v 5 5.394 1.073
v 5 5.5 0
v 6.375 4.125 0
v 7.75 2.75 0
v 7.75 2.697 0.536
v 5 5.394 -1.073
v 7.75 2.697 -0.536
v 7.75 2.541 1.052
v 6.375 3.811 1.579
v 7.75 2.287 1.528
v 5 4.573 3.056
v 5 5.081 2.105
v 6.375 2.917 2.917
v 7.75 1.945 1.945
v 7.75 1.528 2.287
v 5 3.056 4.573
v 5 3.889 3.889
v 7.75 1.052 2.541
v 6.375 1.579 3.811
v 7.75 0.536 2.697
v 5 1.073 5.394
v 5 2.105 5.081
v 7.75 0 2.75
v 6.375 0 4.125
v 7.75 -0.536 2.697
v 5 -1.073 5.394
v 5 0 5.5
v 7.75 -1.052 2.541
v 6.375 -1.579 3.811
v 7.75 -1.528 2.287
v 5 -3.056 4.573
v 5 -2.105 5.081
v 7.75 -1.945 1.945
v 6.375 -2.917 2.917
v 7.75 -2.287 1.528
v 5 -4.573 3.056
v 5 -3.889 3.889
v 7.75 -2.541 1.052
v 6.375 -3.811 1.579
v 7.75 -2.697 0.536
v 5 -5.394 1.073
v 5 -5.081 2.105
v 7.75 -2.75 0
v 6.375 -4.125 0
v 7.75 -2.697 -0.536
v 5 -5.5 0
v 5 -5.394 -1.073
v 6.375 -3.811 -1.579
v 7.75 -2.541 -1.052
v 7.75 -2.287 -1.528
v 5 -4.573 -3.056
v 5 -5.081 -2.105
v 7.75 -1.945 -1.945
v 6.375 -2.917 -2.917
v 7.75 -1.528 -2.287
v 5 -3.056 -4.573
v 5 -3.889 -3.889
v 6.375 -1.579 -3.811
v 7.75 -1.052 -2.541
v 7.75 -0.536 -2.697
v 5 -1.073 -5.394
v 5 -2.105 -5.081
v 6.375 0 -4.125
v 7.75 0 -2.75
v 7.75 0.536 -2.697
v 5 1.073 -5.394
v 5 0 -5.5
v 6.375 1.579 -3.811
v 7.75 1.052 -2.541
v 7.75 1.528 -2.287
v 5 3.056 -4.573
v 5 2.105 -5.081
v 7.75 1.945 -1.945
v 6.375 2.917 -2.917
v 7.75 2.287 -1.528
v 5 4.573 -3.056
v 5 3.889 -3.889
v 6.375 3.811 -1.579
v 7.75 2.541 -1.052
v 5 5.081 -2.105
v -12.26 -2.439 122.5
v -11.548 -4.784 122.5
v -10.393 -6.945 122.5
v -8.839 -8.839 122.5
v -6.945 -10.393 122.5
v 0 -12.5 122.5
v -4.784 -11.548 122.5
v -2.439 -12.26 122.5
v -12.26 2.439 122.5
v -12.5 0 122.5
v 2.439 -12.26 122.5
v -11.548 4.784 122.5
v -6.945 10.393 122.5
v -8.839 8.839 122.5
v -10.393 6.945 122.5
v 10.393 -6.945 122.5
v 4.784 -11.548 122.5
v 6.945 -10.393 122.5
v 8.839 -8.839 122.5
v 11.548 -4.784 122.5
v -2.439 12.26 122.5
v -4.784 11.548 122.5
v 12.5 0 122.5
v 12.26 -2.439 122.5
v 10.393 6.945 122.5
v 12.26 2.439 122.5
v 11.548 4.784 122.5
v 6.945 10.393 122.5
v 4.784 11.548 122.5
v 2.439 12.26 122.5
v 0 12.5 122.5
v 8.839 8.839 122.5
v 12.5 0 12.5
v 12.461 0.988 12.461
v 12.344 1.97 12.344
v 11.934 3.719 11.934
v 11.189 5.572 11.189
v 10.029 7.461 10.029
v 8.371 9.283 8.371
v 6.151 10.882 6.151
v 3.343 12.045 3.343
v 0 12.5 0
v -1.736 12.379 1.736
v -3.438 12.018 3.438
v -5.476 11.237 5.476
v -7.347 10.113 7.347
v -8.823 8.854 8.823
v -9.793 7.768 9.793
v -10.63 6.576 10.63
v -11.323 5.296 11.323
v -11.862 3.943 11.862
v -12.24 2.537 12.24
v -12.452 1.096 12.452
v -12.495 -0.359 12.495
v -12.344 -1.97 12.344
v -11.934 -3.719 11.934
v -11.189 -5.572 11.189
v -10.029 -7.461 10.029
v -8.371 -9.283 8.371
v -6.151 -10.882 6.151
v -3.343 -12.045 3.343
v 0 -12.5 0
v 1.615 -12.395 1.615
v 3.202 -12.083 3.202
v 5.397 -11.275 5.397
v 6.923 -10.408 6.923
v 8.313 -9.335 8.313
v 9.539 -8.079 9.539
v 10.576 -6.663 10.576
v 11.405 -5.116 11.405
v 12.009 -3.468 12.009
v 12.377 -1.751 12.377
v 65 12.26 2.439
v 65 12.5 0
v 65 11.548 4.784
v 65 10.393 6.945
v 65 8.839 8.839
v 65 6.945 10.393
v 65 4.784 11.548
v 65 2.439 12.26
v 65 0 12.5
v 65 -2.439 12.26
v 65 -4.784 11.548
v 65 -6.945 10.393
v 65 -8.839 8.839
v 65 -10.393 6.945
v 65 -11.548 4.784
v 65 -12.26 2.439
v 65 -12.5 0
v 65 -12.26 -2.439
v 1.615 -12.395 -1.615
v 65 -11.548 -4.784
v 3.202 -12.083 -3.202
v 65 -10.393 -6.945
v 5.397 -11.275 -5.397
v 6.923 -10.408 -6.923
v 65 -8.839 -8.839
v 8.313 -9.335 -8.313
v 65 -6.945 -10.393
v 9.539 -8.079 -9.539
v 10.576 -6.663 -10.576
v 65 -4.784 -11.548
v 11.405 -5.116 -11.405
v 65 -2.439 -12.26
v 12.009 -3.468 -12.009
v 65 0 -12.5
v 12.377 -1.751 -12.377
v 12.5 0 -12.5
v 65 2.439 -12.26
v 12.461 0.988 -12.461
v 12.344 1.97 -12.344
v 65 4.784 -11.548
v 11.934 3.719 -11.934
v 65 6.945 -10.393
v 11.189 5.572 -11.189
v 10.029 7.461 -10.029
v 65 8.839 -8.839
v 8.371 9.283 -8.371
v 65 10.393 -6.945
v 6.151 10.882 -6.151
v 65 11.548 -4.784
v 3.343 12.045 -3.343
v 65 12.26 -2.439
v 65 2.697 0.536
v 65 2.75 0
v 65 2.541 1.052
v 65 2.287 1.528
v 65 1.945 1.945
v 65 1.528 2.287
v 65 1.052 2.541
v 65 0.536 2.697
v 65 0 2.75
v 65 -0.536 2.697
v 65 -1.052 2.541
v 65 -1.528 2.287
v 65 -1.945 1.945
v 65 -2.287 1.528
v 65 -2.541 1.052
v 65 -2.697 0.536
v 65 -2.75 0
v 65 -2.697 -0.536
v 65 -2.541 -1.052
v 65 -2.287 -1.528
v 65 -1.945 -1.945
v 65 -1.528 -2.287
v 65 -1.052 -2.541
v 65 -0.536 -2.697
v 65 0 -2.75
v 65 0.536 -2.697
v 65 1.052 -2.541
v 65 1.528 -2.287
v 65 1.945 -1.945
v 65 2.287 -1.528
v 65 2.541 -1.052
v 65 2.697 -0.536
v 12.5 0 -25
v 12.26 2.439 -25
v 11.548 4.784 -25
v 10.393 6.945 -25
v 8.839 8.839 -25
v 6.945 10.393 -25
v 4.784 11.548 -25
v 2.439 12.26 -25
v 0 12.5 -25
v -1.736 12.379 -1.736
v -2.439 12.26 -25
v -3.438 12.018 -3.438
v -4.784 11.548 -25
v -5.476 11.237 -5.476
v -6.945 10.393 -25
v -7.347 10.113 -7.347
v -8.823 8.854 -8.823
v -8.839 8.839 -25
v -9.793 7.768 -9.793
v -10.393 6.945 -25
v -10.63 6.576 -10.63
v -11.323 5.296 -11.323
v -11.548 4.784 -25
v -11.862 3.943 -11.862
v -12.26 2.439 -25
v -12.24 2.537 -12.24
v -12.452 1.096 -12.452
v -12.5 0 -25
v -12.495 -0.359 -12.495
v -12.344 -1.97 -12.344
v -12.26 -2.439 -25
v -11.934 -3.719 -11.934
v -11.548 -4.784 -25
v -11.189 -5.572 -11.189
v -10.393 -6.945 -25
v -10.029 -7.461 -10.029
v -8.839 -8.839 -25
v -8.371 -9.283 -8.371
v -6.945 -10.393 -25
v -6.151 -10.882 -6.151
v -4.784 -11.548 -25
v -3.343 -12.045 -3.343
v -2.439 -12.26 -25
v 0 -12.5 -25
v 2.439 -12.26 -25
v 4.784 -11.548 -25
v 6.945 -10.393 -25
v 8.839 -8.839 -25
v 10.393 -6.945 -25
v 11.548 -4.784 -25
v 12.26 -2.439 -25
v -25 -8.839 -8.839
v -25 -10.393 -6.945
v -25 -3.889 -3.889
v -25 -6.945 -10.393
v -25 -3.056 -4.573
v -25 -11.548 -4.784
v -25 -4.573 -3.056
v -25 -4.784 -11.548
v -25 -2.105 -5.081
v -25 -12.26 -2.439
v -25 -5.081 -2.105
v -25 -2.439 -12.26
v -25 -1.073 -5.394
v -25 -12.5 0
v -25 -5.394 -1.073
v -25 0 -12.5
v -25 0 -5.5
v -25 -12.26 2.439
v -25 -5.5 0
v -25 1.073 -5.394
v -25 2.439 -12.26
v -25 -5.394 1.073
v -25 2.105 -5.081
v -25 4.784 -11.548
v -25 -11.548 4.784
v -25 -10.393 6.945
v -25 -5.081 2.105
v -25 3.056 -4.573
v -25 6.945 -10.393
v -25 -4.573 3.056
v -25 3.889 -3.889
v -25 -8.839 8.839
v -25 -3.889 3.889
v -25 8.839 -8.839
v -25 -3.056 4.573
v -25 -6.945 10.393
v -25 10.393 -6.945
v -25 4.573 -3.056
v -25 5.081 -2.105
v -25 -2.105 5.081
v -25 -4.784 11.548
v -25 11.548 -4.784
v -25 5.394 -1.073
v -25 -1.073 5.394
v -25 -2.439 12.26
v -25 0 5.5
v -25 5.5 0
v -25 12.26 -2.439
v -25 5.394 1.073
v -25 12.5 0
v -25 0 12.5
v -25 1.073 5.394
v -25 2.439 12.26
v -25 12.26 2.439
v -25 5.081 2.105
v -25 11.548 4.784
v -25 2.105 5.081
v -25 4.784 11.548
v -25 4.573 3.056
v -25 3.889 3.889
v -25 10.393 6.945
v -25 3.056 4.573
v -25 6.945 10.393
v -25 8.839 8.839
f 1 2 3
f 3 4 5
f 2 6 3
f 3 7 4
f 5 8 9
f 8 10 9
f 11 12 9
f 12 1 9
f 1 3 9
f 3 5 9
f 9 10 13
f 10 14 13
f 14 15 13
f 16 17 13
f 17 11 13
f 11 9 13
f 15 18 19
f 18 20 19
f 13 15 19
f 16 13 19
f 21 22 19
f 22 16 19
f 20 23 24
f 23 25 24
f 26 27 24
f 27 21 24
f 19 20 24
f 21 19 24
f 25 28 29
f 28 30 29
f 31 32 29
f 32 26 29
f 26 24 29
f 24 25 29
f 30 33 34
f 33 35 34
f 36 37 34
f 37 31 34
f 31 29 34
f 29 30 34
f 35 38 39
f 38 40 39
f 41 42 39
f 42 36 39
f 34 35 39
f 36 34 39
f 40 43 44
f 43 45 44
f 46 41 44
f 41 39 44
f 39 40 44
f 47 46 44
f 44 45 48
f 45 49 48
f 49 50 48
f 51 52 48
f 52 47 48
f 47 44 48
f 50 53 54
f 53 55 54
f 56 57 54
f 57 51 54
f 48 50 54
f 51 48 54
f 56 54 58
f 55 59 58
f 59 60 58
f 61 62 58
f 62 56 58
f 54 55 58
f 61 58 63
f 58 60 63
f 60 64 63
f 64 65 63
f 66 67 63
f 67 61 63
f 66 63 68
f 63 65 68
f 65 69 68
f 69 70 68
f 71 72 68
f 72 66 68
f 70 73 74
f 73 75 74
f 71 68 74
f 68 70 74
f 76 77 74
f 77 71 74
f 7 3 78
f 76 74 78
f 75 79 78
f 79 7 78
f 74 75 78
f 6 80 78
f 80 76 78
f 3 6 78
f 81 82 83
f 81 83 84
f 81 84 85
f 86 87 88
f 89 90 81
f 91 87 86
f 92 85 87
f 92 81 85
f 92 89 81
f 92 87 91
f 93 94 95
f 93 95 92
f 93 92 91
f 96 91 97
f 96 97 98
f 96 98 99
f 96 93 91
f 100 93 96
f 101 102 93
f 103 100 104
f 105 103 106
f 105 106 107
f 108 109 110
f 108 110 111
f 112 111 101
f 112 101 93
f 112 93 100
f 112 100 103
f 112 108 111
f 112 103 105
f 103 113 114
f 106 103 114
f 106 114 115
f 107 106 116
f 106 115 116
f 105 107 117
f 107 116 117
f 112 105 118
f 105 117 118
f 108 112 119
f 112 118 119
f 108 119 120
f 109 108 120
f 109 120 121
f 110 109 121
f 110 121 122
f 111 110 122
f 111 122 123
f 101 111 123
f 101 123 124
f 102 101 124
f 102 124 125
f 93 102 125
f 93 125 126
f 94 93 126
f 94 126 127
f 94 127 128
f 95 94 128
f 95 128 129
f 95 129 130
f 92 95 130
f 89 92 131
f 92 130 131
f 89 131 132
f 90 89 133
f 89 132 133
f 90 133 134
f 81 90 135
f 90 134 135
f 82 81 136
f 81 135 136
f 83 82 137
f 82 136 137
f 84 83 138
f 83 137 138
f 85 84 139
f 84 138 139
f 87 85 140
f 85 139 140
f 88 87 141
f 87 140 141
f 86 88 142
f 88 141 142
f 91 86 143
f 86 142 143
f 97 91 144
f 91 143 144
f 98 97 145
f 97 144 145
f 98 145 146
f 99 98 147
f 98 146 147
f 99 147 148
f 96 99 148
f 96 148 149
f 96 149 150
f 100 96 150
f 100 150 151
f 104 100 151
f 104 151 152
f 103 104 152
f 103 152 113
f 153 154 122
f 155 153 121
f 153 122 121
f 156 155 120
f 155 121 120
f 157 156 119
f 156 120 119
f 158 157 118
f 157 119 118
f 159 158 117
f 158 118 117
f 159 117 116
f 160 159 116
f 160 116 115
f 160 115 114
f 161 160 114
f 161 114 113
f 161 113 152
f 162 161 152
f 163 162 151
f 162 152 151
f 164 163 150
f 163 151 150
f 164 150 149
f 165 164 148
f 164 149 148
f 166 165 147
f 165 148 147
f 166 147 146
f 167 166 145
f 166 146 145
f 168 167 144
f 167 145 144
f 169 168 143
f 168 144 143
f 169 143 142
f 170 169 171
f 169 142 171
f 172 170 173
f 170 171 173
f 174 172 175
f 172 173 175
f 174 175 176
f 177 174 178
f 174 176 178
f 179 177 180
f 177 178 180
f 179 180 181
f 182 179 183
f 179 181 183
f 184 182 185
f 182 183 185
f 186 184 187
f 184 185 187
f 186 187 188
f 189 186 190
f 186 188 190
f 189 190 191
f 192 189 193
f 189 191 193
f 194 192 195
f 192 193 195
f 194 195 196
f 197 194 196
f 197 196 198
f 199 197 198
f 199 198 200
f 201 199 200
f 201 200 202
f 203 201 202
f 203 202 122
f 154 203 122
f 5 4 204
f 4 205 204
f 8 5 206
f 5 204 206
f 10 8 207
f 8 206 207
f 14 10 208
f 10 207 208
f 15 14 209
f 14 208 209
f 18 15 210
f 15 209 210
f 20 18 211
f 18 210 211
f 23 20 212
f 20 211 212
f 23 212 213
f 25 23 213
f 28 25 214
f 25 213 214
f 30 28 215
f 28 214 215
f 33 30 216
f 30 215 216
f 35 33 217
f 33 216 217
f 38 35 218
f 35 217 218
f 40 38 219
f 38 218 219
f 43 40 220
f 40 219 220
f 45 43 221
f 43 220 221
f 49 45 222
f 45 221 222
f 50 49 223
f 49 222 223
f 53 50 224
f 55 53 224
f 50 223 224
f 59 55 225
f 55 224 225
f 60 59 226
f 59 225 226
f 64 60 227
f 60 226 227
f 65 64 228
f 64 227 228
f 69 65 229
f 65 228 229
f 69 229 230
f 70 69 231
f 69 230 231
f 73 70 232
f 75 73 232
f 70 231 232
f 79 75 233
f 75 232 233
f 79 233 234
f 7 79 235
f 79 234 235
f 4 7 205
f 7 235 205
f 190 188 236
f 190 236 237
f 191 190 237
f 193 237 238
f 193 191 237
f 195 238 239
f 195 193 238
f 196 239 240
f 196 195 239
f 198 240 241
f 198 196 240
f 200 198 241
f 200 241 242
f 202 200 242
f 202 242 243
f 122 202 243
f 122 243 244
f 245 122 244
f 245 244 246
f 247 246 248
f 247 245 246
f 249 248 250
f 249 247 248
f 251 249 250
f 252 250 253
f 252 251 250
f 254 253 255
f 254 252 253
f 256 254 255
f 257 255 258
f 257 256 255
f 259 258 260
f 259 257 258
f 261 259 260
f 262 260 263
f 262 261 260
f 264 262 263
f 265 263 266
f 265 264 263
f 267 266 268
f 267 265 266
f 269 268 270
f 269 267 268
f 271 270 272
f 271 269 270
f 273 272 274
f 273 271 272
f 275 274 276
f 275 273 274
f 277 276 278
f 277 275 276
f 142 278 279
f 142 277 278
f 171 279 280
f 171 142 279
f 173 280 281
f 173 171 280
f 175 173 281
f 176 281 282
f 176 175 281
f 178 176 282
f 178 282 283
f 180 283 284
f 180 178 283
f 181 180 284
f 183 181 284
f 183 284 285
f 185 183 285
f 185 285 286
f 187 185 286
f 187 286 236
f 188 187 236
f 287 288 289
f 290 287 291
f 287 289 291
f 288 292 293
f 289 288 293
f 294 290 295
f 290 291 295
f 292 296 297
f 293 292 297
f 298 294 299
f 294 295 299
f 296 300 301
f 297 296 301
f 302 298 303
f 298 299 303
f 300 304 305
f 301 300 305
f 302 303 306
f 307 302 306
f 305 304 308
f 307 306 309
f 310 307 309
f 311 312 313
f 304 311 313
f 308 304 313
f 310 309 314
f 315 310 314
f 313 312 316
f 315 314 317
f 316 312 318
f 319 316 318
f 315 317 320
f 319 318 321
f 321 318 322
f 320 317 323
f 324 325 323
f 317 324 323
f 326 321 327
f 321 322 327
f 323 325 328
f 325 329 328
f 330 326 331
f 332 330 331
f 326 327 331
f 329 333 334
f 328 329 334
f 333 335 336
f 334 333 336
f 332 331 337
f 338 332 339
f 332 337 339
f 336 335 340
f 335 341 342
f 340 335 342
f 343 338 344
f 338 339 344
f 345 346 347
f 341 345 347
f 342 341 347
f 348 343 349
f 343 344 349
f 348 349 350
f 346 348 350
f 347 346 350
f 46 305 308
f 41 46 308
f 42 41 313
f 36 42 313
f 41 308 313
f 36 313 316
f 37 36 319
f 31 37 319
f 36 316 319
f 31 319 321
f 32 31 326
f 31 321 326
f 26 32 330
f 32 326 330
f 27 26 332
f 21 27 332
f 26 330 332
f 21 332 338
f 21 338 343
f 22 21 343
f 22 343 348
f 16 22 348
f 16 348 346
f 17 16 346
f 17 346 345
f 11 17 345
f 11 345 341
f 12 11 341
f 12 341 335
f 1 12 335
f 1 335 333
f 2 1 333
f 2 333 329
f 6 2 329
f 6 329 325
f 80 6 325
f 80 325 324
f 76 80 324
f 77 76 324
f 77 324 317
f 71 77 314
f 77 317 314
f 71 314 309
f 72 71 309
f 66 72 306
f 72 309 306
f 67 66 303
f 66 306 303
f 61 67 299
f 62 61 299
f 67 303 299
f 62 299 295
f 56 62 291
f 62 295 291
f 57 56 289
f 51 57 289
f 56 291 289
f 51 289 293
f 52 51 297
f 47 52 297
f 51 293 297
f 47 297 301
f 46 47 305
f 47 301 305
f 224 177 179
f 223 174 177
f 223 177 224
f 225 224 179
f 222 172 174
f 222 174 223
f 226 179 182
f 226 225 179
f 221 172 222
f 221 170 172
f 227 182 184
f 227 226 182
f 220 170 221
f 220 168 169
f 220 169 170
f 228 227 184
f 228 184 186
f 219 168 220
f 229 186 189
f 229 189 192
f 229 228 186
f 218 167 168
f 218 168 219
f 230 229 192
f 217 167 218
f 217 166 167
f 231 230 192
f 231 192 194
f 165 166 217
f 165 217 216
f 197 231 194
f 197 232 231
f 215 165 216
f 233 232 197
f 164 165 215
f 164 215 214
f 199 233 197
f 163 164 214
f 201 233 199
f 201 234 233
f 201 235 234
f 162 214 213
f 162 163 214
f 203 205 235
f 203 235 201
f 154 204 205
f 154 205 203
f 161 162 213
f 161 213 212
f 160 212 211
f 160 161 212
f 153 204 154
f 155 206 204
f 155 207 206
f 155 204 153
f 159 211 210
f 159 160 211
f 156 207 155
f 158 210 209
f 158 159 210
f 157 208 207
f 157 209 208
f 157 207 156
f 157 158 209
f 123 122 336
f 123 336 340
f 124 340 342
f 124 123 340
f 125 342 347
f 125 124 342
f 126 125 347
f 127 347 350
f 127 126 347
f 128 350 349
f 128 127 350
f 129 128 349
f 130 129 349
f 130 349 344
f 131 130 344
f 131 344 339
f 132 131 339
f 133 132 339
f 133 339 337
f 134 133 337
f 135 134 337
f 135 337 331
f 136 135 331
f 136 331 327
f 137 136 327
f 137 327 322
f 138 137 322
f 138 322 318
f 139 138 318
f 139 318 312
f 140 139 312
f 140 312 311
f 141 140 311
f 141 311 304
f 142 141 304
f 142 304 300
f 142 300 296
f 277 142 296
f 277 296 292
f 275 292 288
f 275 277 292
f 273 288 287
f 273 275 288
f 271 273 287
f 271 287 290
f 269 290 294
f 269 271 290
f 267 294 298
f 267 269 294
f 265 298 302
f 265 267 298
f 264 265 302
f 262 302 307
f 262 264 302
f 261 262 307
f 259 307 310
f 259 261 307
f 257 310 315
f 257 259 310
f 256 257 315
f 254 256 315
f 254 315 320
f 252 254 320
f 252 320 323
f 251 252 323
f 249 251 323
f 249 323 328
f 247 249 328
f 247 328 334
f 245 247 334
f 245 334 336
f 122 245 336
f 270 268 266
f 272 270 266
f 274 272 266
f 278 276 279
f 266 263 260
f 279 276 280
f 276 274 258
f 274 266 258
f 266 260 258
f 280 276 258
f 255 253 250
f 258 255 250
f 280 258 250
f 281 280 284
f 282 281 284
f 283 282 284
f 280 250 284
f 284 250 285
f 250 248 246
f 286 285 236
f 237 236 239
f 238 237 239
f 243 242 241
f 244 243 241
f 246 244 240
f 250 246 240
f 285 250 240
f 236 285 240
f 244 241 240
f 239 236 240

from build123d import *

# Parameters (mm, degrees)
F0_R           = 12.5
F1_DEPTH       = 122.5
F2_R           = 12.5
F3_DEPTH       = 65
F4_DEPTH       = 25
F5_DEPTH       = 25
F6_R           = 5.5
F7_DEPTH       = 30
F9_D           = 5.5
F9_DEPTH       = 100
F9_CSINK_D     = 11
F9_CSINK_ANGLE = 90


with BuildPart() as f1:
    # F0 (on Top) → F1 (new body)
    with BuildSketch(Plane.XY):
        Circle(F0_R)
    extrude(amount=F1_DEPTH)

    # F2 (on Right) → F3 (join)
    with BuildSketch(Plane.YZ):
        Circle(F2_R)
    extrude(amount=F3_DEPTH)

    # F2 (on Right) → F4 (join)
    with BuildSketch(Plane.YZ):
        Circle(F2_R)
    extrude(amount=-F4_DEPTH)

    # F0 (on Top) → F5 (join)
    with BuildSketch(Plane.XY):
        Circle(F0_R)
    extrude(amount=-F5_DEPTH)

    # F6 (on face) → F7 (cut)
    with BuildSketch(Plane(origin=(-25, 0, 0), x_dir=(0, -1, 0), z_dir=(-1, 0, 0))):
        Circle(F6_R)
    extrude(amount=-F7_DEPTH, mode=Mode.SUBTRACT)

    # F9
    with Locations(Plane(origin=(5, 0, 0), x_dir=(0, -1, 0), z_dir=(-1, 0, 0))):
        with Locations((0, 0)):
            CounterSinkHole(F9_D / 2, F9_CSINK_D / 2, depth=F9_DEPTH, counter_sink_angle=F9_CSINK_ANGLE)


solid = f1.part
